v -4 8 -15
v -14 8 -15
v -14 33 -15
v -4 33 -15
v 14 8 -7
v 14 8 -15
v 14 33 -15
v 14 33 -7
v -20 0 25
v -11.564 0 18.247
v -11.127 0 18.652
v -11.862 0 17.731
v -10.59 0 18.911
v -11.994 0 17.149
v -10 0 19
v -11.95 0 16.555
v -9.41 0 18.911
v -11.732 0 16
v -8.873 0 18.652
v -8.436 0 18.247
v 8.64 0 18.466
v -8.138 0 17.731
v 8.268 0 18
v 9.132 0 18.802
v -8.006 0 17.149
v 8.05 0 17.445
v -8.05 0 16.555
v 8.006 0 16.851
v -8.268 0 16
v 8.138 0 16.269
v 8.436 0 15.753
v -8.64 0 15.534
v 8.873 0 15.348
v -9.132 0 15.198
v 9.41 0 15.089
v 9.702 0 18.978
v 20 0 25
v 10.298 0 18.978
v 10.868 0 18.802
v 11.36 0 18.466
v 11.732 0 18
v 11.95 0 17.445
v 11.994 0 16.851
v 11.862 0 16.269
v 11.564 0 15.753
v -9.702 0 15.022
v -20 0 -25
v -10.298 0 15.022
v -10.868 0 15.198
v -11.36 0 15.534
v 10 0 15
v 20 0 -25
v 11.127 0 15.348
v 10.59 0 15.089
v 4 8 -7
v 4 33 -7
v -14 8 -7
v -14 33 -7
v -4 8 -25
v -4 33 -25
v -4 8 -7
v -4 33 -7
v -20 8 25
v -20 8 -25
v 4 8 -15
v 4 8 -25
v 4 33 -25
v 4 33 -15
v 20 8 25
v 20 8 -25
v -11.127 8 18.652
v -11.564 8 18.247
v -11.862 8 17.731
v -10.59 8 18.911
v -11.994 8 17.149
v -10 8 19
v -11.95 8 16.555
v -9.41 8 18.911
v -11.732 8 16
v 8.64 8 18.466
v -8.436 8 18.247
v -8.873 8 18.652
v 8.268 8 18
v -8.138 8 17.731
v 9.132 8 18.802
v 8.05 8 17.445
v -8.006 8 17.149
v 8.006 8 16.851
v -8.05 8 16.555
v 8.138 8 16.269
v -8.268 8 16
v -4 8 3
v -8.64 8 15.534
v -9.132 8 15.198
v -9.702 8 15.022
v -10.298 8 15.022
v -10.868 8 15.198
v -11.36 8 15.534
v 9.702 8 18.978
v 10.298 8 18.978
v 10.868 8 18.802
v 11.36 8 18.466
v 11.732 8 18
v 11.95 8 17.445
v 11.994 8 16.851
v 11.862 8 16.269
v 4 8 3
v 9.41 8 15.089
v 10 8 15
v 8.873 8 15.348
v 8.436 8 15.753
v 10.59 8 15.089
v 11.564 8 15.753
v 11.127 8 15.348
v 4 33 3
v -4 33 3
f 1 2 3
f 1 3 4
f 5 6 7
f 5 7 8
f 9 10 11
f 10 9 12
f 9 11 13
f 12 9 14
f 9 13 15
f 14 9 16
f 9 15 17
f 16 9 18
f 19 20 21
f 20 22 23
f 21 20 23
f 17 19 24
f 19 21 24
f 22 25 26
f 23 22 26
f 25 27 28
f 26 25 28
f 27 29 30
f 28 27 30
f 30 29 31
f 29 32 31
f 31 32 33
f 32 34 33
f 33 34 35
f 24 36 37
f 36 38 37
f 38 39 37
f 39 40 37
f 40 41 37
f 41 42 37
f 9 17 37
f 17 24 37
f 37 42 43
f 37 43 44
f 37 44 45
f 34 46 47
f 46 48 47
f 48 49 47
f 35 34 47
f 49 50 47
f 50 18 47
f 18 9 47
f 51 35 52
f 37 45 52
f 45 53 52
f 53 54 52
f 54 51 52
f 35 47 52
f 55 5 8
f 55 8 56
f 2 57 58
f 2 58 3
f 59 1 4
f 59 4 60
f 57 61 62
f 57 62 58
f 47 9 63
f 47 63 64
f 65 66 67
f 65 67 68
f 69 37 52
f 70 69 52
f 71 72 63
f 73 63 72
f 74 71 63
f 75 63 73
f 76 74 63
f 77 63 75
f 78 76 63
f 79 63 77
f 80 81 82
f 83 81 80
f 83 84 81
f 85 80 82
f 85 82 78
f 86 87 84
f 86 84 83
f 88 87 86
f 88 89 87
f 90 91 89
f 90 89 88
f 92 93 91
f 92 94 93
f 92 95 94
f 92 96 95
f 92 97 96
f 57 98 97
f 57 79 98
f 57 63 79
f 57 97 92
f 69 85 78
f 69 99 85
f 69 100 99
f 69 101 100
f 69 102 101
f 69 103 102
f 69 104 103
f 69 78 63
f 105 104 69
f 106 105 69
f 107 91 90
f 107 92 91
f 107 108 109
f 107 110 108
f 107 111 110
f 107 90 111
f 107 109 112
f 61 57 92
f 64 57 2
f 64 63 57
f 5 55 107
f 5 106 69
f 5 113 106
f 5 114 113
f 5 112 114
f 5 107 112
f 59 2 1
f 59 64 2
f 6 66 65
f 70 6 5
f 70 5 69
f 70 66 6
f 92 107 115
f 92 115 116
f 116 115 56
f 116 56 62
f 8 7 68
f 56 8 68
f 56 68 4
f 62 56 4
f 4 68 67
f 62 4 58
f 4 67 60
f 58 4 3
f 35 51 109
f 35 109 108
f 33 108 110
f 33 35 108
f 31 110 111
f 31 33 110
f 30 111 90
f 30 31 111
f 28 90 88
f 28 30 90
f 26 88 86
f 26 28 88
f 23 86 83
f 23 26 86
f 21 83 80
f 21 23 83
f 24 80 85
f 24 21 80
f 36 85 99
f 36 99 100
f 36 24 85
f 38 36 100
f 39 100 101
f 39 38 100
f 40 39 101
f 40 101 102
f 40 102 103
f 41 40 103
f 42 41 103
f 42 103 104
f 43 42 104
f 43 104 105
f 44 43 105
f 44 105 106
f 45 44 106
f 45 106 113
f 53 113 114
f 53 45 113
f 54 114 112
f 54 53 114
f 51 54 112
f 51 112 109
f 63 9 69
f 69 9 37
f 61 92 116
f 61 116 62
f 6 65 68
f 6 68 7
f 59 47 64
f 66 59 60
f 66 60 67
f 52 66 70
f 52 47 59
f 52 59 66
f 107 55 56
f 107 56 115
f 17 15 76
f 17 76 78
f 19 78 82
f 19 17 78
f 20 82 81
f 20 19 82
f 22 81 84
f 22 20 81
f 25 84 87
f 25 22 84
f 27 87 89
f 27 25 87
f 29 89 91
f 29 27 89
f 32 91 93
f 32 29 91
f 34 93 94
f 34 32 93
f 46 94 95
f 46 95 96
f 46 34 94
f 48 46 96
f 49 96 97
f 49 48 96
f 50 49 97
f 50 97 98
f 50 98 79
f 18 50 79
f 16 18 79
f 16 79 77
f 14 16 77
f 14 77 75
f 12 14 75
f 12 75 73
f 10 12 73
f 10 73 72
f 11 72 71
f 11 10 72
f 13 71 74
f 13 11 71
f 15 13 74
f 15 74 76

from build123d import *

# Parameters (mm, degrees)
SKETCH1_W           = 40
SKETCH1_H           = 50
SKETCH1_R           = 2
BOSS_EXTRUDE1_DEPTH = 8
BOSS_EXTRUDE2_DEPTH = 25


with BuildPart() as part:
    # Sketch1 → Boss-Extrude1 (new body)
    with BuildSketch(Plane(origin=(0, 0, 0), x_dir=(1, 0, 0), z_dir=(0, 1, 0))):
        Rectangle(SKETCH1_W, SKETCH1_H)
        with Locations(Location((-10, -17, 0), (0, 0, 270))):
            Circle(SKETCH1_R, mode=Mode.SUBTRACT)
        with Locations(Location((10, -17, 0), (0, 0, 90))):
            Circle(SKETCH1_R, mode=Mode.SUBTRACT)
    extrude(amount=BOSS_EXTRUDE1_DEPTH)

    # Sketch2 → Boss-Extrude2 (add)
    with BuildSketch(Plane(origin=(0, 8, 0), x_dir=(1, 0, 0), z_dir=(0, 1, 0))):
        Polygon((-4, 25), (4, 25), (4, 15), (14, 15), (14, 7), (4, 7), (4, -3), (-4, -3), (-4, 7), (-14, 7), (-14, 15), (-4, 15), align=None)
    extrude(amount=BOSS_EXTRUDE2_DEPTH)


solid = part.part
